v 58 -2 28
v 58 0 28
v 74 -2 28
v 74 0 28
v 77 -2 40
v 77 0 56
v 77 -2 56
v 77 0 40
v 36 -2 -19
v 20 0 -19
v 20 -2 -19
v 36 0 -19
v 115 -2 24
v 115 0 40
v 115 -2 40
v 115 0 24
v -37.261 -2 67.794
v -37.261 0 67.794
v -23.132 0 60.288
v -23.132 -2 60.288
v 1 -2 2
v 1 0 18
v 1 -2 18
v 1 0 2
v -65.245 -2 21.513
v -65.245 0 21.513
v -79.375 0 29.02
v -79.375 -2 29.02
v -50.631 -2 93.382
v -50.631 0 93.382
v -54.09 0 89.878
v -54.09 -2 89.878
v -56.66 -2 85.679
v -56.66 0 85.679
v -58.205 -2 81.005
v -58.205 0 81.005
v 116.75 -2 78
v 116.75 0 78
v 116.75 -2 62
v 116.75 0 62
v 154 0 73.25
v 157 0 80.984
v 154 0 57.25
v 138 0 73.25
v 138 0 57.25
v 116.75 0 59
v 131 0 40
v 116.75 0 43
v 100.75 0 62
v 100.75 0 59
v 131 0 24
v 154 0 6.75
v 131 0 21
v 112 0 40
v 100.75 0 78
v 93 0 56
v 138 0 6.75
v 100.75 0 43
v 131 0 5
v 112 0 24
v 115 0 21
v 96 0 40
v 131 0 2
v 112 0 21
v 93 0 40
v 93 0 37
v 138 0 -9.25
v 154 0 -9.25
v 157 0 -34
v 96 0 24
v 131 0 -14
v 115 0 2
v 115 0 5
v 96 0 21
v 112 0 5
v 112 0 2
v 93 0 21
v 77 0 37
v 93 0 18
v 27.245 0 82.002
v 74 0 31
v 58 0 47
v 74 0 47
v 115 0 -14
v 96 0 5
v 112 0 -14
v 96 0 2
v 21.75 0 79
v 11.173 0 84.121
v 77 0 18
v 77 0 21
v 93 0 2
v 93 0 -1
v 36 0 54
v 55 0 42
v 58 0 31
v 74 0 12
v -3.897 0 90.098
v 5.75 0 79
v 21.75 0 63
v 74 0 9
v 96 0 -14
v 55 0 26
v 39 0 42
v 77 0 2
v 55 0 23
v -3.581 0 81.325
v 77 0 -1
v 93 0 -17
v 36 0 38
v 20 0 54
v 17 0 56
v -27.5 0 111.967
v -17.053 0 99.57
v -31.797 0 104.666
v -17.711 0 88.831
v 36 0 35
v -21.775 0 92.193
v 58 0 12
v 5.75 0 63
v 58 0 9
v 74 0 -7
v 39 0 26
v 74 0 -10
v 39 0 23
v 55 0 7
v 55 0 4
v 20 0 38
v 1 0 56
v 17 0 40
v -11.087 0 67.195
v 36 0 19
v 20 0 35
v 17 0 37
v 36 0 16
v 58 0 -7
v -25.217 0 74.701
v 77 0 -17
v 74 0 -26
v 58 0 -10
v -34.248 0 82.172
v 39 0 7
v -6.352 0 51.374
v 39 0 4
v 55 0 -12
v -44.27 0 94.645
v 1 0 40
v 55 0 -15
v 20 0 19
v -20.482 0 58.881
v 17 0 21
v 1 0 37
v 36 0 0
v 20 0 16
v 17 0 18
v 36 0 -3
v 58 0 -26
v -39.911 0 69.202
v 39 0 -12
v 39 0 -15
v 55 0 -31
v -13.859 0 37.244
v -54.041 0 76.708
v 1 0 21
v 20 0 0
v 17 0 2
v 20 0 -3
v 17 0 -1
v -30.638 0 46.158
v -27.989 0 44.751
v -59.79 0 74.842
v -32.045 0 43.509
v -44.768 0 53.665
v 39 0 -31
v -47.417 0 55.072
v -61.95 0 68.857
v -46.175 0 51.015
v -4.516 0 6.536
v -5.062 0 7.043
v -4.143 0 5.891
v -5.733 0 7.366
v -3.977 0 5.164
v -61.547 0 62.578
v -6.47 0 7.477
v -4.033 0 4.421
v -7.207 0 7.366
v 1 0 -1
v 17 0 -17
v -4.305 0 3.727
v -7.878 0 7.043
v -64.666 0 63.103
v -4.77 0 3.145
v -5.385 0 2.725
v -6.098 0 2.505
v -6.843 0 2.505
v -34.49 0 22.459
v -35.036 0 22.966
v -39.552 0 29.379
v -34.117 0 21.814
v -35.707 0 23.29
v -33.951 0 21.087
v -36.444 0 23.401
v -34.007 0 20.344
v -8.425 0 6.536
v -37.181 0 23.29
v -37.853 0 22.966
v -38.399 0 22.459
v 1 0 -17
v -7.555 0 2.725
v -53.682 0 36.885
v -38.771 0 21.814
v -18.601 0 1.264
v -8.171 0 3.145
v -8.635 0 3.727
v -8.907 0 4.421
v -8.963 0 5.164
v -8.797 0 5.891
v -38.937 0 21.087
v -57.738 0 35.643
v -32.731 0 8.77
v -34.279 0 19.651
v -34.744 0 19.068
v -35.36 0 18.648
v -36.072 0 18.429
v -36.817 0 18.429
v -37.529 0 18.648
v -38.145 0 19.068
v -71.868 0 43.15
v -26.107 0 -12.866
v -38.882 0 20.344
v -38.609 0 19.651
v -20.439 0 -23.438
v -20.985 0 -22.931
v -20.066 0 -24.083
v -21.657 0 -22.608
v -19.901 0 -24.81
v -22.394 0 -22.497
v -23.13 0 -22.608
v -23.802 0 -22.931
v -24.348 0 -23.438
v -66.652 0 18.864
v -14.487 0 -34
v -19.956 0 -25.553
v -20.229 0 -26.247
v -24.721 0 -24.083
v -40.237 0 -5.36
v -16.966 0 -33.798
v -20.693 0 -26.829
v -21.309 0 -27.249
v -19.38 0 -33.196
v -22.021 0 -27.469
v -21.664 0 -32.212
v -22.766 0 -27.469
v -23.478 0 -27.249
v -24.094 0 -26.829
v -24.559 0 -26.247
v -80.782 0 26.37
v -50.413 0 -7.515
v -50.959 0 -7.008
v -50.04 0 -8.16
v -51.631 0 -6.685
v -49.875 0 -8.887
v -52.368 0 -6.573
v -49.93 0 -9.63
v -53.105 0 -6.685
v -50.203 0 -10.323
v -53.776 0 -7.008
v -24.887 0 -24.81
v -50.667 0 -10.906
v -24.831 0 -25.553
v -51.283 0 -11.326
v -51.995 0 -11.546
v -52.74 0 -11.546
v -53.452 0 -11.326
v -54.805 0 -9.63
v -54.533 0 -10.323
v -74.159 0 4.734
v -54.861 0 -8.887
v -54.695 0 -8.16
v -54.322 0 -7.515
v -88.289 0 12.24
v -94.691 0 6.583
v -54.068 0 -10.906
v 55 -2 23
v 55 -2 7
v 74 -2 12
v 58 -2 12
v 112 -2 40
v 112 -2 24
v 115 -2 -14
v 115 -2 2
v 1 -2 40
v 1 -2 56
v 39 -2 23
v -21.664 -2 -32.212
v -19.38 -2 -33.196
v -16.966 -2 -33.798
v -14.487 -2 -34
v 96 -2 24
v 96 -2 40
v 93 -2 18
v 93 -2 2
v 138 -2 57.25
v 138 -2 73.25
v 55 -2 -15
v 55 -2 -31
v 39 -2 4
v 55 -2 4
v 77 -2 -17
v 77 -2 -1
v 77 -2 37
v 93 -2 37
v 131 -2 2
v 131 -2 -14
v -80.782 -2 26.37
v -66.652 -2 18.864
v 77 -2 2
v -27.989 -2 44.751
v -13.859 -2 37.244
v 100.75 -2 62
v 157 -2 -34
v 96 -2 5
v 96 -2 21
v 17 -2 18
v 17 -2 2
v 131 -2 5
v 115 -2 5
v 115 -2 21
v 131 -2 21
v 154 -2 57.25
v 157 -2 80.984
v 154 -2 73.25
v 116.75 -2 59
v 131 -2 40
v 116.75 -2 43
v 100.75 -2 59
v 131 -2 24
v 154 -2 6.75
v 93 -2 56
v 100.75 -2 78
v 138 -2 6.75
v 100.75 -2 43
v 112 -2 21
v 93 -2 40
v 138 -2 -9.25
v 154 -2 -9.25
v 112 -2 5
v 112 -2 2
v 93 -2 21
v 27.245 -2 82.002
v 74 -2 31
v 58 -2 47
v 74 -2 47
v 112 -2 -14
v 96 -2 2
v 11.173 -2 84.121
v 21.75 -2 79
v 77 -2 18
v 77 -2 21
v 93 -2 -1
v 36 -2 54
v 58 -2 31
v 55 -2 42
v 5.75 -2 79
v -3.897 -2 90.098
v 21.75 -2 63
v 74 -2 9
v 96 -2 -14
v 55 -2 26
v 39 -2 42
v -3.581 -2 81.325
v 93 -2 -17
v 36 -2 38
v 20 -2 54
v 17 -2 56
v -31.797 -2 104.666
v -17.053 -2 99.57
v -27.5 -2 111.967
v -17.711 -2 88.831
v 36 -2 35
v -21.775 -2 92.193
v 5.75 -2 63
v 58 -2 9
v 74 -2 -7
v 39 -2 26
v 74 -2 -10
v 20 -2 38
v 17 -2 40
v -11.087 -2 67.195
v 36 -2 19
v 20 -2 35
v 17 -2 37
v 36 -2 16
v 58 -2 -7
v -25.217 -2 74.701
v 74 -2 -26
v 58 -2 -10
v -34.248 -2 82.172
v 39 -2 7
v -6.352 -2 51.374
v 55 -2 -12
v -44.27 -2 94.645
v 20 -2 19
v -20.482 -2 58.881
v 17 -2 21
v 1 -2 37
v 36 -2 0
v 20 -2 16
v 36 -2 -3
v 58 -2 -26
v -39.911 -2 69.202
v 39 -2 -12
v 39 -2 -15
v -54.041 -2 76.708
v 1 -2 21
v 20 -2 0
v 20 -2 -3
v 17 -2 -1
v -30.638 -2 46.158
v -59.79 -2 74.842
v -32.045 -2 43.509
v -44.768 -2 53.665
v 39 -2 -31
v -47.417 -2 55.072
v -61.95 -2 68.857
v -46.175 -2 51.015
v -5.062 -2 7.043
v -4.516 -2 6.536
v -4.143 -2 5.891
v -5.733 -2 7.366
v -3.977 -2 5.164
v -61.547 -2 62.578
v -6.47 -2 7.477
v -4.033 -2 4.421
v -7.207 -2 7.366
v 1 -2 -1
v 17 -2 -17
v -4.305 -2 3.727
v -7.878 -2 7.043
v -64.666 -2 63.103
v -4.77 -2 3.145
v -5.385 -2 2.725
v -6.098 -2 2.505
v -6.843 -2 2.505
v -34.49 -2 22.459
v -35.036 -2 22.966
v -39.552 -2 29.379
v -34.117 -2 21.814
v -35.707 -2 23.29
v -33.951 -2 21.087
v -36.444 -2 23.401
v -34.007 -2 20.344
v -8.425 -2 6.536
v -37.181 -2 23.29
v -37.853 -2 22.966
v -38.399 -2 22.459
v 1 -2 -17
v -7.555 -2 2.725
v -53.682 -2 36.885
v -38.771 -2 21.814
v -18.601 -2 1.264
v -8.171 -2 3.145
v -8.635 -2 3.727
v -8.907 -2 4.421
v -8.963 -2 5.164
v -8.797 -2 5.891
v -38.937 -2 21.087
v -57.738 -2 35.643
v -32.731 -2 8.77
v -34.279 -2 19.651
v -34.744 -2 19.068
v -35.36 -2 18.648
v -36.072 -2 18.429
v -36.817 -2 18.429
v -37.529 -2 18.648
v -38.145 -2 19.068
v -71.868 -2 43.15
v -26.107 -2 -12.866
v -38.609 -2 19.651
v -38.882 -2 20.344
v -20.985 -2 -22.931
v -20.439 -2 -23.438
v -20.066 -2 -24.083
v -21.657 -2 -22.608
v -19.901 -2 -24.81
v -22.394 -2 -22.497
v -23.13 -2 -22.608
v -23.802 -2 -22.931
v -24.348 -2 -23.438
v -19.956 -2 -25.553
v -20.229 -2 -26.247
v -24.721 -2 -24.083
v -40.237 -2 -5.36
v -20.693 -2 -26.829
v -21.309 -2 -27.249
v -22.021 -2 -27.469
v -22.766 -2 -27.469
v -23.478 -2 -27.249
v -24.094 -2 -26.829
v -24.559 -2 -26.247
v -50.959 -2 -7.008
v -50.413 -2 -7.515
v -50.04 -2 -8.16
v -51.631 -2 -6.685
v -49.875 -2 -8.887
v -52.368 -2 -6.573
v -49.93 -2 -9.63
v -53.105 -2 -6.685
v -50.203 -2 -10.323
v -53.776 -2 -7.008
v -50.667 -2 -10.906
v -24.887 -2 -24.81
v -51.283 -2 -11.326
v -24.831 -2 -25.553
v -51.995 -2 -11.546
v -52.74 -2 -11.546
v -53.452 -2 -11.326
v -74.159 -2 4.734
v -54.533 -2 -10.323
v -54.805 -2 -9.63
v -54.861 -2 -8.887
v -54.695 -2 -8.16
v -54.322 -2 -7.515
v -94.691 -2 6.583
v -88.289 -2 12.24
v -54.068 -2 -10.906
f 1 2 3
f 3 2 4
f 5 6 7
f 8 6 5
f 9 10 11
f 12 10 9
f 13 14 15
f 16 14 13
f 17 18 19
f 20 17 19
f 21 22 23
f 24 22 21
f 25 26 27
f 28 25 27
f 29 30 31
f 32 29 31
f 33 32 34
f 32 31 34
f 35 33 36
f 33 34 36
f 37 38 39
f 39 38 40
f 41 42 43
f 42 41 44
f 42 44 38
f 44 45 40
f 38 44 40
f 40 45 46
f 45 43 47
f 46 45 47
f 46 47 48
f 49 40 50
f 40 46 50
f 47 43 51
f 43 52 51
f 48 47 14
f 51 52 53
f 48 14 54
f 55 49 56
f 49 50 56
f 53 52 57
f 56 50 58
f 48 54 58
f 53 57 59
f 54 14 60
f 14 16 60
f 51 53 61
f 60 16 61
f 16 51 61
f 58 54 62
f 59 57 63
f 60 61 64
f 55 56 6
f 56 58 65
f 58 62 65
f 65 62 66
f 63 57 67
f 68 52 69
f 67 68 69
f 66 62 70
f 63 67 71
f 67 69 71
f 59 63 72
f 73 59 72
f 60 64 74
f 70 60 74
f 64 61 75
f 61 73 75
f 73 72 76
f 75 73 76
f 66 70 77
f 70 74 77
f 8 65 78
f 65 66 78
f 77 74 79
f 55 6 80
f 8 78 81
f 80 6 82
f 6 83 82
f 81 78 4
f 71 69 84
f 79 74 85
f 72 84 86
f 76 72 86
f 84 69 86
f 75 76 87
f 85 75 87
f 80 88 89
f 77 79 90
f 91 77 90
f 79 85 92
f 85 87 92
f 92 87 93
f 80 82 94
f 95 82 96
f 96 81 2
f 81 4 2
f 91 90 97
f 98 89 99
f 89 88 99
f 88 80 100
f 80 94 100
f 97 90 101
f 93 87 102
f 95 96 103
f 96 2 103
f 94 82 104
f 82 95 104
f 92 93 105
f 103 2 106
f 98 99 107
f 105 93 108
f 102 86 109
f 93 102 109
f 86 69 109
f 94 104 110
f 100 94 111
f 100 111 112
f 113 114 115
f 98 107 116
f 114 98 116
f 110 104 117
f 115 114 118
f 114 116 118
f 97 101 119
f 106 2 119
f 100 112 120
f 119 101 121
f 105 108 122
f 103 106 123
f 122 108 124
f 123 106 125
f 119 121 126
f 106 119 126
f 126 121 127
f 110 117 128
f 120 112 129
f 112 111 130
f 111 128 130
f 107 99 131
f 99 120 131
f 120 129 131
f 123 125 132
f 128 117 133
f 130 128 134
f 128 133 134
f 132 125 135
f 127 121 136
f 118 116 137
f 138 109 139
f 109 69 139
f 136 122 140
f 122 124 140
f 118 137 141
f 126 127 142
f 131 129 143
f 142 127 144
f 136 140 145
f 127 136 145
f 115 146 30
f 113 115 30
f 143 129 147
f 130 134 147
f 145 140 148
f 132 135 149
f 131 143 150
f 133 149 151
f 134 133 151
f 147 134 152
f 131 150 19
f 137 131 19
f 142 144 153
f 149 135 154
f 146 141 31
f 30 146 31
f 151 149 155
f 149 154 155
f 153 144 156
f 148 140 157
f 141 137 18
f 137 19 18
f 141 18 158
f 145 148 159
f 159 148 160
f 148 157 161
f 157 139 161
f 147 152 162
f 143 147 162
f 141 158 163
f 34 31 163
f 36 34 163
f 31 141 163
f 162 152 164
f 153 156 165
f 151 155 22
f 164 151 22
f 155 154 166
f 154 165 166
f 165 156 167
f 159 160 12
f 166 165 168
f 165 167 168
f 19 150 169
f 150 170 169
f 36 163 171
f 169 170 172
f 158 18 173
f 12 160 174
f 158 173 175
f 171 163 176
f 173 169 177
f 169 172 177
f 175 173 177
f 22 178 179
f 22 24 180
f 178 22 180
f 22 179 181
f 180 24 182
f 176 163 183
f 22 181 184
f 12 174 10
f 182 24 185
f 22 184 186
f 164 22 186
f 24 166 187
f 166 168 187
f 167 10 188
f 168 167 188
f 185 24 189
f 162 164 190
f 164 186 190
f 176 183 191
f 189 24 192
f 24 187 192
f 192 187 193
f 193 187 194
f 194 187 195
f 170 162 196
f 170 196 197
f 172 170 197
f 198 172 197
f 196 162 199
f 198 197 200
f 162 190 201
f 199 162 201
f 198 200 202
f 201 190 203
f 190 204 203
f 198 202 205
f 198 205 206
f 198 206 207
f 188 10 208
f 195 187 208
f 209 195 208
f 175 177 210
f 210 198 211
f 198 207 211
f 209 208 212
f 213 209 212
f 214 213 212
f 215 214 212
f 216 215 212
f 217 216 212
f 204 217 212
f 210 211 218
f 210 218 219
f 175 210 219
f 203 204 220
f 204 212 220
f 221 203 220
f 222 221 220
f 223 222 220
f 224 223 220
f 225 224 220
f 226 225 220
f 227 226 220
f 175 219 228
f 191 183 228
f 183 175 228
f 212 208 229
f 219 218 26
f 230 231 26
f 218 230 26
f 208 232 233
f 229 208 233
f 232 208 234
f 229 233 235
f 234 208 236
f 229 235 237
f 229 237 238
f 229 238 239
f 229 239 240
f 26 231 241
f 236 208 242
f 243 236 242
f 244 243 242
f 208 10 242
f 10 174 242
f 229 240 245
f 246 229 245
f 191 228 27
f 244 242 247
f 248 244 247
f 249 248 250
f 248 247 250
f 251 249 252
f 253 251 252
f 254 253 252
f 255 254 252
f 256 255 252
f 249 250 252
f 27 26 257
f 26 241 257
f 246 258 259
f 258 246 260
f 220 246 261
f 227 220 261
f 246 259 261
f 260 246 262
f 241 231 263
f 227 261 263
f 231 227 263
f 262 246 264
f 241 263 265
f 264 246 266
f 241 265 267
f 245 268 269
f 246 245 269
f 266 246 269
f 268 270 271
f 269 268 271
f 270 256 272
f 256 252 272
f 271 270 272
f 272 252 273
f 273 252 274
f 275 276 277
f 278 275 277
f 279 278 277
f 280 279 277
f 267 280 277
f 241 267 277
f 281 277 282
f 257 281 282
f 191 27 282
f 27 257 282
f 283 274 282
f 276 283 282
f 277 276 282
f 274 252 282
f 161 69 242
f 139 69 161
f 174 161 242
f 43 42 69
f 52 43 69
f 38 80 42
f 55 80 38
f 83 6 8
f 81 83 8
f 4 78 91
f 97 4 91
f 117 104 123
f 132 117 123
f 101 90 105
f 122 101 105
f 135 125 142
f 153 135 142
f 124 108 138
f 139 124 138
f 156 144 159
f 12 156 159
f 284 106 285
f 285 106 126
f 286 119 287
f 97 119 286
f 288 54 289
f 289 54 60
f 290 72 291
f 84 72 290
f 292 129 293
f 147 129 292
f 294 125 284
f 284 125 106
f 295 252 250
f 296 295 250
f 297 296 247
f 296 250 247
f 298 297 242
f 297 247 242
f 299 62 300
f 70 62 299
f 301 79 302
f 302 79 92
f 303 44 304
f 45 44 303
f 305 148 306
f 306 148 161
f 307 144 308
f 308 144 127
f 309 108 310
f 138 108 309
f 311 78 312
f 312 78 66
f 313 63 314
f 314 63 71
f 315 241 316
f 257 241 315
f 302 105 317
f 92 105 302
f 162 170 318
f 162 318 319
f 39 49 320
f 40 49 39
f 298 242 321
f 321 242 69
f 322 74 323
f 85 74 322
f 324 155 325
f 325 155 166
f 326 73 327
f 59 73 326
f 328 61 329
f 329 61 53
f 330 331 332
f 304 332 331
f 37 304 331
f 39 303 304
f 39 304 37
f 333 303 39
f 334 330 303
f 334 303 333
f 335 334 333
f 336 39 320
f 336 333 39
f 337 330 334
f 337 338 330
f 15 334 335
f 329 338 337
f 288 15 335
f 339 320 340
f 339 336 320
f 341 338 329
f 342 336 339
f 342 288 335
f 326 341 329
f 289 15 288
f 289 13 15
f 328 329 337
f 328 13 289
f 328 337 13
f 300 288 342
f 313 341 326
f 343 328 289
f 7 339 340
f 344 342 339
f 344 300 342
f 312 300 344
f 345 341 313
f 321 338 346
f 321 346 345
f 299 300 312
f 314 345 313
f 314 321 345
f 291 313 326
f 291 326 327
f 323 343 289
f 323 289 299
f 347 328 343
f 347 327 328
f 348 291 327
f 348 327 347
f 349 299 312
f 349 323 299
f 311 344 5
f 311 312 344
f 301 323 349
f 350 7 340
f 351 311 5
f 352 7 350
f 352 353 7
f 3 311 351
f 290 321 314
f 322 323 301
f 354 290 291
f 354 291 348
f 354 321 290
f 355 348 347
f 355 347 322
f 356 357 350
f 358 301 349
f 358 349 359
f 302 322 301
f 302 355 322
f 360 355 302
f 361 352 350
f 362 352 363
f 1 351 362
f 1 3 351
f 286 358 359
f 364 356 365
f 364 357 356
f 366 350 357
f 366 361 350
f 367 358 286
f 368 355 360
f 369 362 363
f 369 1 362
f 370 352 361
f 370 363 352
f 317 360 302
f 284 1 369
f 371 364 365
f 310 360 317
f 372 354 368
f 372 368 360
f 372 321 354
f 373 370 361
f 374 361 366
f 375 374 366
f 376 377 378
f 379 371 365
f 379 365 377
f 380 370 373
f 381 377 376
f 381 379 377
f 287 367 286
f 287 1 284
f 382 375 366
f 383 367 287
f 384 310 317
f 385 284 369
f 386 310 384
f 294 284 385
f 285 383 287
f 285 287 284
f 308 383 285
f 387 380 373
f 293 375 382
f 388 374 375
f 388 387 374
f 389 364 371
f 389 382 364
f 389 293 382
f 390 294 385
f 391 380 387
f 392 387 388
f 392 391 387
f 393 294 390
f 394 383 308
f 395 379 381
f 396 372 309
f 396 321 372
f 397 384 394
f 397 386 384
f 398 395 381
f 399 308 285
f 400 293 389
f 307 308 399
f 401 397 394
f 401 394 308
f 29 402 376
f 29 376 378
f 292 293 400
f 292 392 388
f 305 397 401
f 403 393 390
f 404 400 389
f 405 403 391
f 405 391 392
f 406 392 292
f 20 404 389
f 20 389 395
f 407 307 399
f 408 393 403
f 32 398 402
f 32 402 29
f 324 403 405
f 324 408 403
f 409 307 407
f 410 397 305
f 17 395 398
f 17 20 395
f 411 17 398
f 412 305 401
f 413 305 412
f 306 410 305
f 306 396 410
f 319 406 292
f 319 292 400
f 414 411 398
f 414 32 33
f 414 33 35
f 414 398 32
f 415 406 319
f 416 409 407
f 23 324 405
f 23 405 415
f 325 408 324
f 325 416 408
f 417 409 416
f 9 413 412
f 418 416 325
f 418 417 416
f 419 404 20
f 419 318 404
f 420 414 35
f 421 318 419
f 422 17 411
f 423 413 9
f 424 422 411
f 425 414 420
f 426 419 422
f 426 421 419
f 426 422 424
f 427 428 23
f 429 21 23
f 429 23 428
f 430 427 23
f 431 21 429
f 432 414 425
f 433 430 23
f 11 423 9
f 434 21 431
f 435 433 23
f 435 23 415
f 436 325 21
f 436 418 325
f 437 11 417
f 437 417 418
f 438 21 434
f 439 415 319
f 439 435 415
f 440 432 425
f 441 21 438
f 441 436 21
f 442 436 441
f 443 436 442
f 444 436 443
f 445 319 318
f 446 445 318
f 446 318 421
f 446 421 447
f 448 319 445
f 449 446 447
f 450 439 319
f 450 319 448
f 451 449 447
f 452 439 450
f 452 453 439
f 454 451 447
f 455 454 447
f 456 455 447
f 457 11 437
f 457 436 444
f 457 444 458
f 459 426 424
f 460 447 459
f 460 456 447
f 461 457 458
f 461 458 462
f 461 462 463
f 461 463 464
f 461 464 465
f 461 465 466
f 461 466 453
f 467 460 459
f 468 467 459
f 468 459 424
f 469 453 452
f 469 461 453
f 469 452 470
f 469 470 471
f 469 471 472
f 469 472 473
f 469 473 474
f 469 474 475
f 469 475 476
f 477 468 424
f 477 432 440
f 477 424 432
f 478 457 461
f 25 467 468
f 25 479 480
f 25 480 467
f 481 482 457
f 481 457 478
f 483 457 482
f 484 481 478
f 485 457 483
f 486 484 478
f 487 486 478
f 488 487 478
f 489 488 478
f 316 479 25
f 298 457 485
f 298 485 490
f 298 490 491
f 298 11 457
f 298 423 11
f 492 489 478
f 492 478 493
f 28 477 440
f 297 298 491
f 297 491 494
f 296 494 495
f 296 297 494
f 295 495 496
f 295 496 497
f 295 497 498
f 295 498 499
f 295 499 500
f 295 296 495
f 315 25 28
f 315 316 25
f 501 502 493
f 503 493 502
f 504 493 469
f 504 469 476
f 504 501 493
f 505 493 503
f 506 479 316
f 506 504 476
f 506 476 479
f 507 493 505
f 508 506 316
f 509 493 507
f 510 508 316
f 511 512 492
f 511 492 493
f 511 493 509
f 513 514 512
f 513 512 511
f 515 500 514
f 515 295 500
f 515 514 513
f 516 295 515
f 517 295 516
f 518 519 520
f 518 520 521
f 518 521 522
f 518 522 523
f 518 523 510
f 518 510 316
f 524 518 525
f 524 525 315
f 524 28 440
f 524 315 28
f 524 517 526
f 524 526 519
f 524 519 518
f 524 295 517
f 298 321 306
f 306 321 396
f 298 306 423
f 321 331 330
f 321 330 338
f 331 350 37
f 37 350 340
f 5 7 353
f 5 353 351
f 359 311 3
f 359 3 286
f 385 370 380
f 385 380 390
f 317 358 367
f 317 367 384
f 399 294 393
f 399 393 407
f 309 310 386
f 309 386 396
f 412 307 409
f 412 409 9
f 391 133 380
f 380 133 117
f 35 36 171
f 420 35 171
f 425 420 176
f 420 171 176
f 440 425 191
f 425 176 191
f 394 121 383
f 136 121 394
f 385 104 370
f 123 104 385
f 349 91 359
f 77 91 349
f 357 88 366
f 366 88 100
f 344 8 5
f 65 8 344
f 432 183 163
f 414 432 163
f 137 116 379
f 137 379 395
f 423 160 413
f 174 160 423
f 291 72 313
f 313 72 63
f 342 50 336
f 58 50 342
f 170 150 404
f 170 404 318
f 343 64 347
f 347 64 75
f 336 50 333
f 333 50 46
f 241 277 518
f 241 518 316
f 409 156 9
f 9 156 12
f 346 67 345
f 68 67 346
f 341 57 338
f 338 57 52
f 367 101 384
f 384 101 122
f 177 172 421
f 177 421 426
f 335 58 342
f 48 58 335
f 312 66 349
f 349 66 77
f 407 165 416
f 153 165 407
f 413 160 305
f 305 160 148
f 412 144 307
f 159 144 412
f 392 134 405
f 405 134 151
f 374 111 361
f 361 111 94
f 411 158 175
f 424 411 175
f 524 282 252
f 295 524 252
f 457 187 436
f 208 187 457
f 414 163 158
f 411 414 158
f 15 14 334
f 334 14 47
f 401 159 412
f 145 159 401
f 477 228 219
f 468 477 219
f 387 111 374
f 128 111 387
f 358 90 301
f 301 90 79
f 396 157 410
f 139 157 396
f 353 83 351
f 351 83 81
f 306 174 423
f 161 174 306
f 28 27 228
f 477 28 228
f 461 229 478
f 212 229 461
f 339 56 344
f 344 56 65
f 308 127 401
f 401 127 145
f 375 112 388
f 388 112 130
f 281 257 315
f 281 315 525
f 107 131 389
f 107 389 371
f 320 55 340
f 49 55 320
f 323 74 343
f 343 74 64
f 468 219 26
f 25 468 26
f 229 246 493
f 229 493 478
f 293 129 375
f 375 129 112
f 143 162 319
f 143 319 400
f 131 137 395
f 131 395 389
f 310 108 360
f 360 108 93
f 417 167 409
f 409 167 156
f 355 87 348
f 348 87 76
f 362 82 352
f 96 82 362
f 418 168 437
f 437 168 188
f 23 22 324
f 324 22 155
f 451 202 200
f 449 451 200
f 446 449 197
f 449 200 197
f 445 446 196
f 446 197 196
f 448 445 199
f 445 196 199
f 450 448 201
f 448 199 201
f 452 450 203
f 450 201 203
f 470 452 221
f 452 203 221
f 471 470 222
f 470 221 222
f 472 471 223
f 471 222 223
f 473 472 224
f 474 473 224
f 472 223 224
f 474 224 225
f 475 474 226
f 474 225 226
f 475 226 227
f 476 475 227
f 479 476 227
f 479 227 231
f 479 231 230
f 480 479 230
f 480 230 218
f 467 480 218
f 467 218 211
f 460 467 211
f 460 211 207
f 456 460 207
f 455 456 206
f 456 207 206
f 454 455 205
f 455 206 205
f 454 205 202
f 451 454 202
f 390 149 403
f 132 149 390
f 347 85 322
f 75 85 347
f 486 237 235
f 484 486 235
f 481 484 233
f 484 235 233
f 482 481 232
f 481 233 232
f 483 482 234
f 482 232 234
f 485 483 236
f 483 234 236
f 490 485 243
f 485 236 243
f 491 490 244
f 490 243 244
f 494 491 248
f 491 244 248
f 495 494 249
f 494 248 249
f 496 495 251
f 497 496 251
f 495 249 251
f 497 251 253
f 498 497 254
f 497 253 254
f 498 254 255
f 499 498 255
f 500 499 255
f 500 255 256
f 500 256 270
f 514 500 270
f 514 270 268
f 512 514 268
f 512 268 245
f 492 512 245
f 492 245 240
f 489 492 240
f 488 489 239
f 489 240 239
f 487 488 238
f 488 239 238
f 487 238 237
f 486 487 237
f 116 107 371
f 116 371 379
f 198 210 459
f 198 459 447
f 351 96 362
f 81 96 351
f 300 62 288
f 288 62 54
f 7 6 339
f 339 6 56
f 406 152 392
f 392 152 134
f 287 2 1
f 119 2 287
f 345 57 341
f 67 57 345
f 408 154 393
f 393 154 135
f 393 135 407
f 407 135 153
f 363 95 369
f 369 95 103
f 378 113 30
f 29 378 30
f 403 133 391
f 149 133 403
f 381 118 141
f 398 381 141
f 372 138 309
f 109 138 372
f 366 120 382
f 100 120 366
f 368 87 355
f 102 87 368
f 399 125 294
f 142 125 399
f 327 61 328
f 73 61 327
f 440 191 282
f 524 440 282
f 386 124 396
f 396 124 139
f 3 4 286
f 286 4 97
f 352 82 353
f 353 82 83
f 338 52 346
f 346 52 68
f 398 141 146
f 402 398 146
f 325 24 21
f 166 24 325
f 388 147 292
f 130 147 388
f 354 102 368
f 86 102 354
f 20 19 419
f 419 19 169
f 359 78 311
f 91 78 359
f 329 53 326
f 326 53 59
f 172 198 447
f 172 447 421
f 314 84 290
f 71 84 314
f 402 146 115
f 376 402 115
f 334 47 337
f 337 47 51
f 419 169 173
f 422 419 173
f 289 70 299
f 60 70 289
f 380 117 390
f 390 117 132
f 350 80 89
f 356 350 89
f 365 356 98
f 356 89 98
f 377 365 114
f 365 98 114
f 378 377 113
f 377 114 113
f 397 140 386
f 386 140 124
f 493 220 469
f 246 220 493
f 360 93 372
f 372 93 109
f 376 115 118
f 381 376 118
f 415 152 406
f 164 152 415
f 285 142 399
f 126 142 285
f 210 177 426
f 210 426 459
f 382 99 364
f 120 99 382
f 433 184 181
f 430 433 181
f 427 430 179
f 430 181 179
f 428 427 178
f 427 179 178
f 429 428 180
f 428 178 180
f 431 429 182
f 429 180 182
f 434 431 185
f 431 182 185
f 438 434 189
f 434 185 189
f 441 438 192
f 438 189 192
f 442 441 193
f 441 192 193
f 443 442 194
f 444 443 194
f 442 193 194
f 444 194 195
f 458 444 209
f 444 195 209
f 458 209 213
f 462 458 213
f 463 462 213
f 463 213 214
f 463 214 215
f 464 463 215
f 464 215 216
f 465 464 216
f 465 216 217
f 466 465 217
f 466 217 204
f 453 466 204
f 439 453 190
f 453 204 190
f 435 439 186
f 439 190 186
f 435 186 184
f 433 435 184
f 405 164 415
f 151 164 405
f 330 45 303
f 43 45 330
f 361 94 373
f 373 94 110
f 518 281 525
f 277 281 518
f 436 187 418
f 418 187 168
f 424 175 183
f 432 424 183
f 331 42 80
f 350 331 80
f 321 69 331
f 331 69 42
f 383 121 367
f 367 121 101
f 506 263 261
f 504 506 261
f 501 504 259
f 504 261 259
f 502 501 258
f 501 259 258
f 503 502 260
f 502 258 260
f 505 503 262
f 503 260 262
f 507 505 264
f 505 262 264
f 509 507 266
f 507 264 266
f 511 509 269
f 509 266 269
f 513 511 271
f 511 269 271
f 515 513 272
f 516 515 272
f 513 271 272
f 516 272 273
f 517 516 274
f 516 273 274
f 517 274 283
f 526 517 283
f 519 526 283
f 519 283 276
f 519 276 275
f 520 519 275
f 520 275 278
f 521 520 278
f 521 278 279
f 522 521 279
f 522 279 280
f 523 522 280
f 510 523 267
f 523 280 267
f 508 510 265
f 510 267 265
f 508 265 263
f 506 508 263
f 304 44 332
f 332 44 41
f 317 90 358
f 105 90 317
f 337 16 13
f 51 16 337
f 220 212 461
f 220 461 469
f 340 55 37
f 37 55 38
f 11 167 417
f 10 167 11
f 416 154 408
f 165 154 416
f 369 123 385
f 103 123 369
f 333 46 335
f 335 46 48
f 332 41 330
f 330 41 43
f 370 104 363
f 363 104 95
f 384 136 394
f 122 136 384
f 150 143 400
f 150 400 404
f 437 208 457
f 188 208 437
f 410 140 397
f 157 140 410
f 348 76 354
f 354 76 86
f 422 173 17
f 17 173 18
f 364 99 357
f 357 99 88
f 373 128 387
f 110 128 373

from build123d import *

# Parameters (mm, degrees)
SKETCH3_R   = 2.5
SKETCH3_W   = 16
SKETCH3_H   = 16
LASER_DEPTH = 2


with BuildPart() as part:
    # Sketch3 → Laser (new body)
    with BuildSketch(Plane(origin=(0, 0, 0), x_dir=(1, 0, 0), z_dir=(0, 1, 0))):
        with BuildLine():
            Line((-94.691051343, -6.582969065), (-21.663792567, 32.211956563))
            ThreePointArc((-21.663792567, 32.211956563), (-18.18495221, 33.546260198), (-14.486734177, 34))
            Line((-14.486734177, 34), (157, 34))
            Line((157, 34), (157, -80.984375239))
            Line((157, -80.984375239), (27.245097002, -82.002060753))
            ThreePointArc((27.245097002, -82.002060753), (-3.897107576, -90.097611519), (-27.500192145, -111.966979298))
            Line((-27.500192145, -111.966979298), (-50.631086639, -93.38167756))
            ThreePointArc((-50.631086639, -93.38167756), (-55.49562639, -87.852512852), (-58.20502519, -81.004552024))
            ThreePointArc((-58.20502519, -81.004552024), (-60.798796423, -71.823881458), (-64.66560314, -63.102633435))
            Line((-64.66560314, -63.102633435), (-94.691051343, -6.582969065))
        make_face()
        with Locations(Location((-22.393572022, 24.996840478, 0), (0, 0, 270))):
            Circle(SKETCH3_R, mode=Mode.SUBTRACT)
        with Locations(Location((-6.470173498, -4.977237981, 0), (0, 0, 270))):
            Circle(SKETCH3_R, mode=Mode.SUBTRACT)
        with Locations(Location((-36.444251957, -20.900636504, 0), (0, 0, 270))):
            Circle(SKETCH3_R, mode=Mode.SUBTRACT)
        with Locations(Location((-52.367650481, 9.073441955, 0), (0, 0, 270))):
            Circle(SKETCH3_R, mode=Mode.SUBTRACT)
        with Locations((9, -10)):
            Rectangle(SKETCH3_W, SKETCH3_H, mode=Mode.SUBTRACT)
        with Locations((9, 9)):
            Rectangle(SKETCH3_W, SKETCH3_H, mode=Mode.SUBTRACT)
        with Locations((28, 11)):
            Rectangle(SKETCH3_W, SKETCH3_H, mode=Mode.SUBTRACT)
        with Locations((47, 23)):
            Rectangle(SKETCH3_W, SKETCH3_H, mode=Mode.SUBTRACT)
        with Locations((66, 18)):
            Rectangle(SKETCH3_W, SKETCH3_H, mode=Mode.SUBTRACT)
        with Locations((85, 9)):
            Rectangle(SKETCH3_W, SKETCH3_H, mode=Mode.SUBTRACT)
        with Locations((104, 6)):
            Rectangle(SKETCH3_W, SKETCH3_H, mode=Mode.SUBTRACT)
        with Locations((123, 6)):
            Rectangle(SKETCH3_W, SKETCH3_H, mode=Mode.SUBTRACT)
        with Locations((146, 1.25)):
            Rectangle(SKETCH3_W, SKETCH3_H, mode=Mode.SUBTRACT)
        with Locations((146, -65.25)):
            Rectangle(SKETCH3_W, SKETCH3_H, mode=Mode.SUBTRACT)
        with Locations((28, -8)):
            Rectangle(SKETCH3_W, SKETCH3_H, mode=Mode.SUBTRACT)
        with Locations((47, 4)):
            Rectangle(SKETCH3_W, SKETCH3_H, mode=Mode.SUBTRACT)
        with Locations((66, -1)):
            Rectangle(SKETCH3_W, SKETCH3_H, mode=Mode.SUBTRACT)
        with Locations((85, -10)):
            Rectangle(SKETCH3_W, SKETCH3_H, mode=Mode.SUBTRACT)
        with Locations((104, -13)):
            Rectangle(SKETCH3_W, SKETCH3_H, mode=Mode.SUBTRACT)
        with Locations((123, -13)):
            Rectangle(SKETCH3_W, SKETCH3_H, mode=Mode.SUBTRACT)
        with Locations((9, -29)):
            Rectangle(SKETCH3_W, SKETCH3_H, mode=Mode.SUBTRACT)
        with Locations((28, -27)):
            Rectangle(SKETCH3_W, SKETCH3_H, mode=Mode.SUBTRACT)
        with Locations((47, -15)):
            Rectangle(SKETCH3_W, SKETCH3_H, mode=Mode.SUBTRACT)
        with Locations((66, -20)):
            Rectangle(SKETCH3_W, SKETCH3_H, mode=Mode.SUBTRACT)
        with Locations((85, -29)):
            Rectangle(SKETCH3_W, SKETCH3_H, mode=Mode.SUBTRACT)
        with Locations((104, -32)):
            Rectangle(SKETCH3_W, SKETCH3_H, mode=Mode.SUBTRACT)
        with Locations((123, -32)):
            Rectangle(SKETCH3_W, SKETCH3_H, mode=Mode.SUBTRACT)
        with Locations((9, -48)):
            Rectangle(SKETCH3_W, SKETCH3_H, mode=Mode.SUBTRACT)
        with Locations((28, -46)):
            Rectangle(SKETCH3_W, SKETCH3_H, mode=Mode.SUBTRACT)
        with Locations((47, -34)):
            Rectangle(SKETCH3_W, SKETCH3_H, mode=Mode.SUBTRACT)
        with Locations((66, -39)):
            Rectangle(SKETCH3_W, SKETCH3_H, mode=Mode.SUBTRACT)
        with Locations((85, -48)):
            Rectangle(SKETCH3_W, SKETCH3_H, mode=Mode.SUBTRACT)
        Polygon((-88.288511049, -12.240484229), (-74.158594957, -4.734122178), (-66.652232907, -18.86403827), (-80.782148999, -26.370400321), align=None, mode=Mode.SUBTRACT)
        with Locations((13.75, -71)):
            Rectangle(SKETCH3_W, SKETCH3_H, mode=Mode.SUBTRACT)
        with Locations((108.75, -51)):
            Rectangle(SKETCH3_W, SKETCH3_H, mode=Mode.SUBTRACT)
        with Locations((108.75, -70)):
            Rectangle(SKETCH3_W, SKETCH3_H, mode=Mode.SUBTRACT)
        Polygon((-65.244790023, -21.513397538), (-79.374706115, -29.019759588), (-71.868344064, -43.14967568), (-57.738427972, -35.64331363), align=None, mode=Mode.SUBTRACT)
        Polygon((-53.68162582, -36.885230013), (-39.551709728, -29.378867962), (-32.045347678, -43.508784054), (-46.17526377, -51.015146105), align=None, mode=Mode.SUBTRACT)
        Polygon((-27.988545526, -44.750700437), (-13.858629434, -37.244338387), (-6.352267384, -51.374254479), (-20.482183476, -58.880616529), align=None, mode=Mode.SUBTRACT)
        Polygon((-30.637904794, -46.158143322), (-44.767820886, -53.664505372), (-37.261458835, -67.794421464), (-23.131542743, -60.288059414), align=None, mode=Mode.SUBTRACT)
        Polygon((-47.417180153, -55.071948256), (-61.547096245, -62.578310307), (-54.040734195, -76.708226399), (-39.910818103, -69.201864348), align=None, mode=Mode.SUBTRACT)
        Polygon((-34.248075282, -82.171885463), (-44.269669774, -94.644561352), (-31.796993885, -104.666155844), (-21.775399393, -92.193479955), align=None, mode=Mode.SUBTRACT)
        Polygon((-25.21699676, -74.701037634), (-11.087080668, -67.194675584), (-3.580718618, -81.324591676), (-17.71063471, -88.830953726), align=None, mode=Mode.SUBTRACT)
        Polygon((-40.237051061, 5.359879008), (-26.107134969, 12.866241058), (-18.600772918, -1.263675034), (-32.73068901, -8.770037084), align=None, mode=Mode.SUBTRACT)
    extrude(amount=-LASER_DEPTH)


solid = part.part
